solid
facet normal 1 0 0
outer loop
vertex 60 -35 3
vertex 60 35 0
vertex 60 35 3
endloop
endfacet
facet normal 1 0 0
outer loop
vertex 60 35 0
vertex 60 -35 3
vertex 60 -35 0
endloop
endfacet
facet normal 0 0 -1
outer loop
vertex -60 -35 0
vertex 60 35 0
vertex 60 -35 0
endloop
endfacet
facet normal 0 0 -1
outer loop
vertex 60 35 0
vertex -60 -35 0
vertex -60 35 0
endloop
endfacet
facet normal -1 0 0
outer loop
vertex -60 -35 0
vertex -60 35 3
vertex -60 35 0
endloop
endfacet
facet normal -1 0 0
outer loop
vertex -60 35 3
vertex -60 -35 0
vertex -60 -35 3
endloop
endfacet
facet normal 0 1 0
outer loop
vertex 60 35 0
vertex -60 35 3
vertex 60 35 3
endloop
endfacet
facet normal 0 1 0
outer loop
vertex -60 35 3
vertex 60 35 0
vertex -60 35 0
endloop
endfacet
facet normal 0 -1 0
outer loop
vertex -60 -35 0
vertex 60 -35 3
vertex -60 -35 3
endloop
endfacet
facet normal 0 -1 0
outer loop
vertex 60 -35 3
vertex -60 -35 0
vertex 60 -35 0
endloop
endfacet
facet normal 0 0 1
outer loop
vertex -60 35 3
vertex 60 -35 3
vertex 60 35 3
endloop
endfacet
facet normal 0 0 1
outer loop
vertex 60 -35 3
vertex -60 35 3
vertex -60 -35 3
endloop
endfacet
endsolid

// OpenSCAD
// Mini horizontal gel-electrophoresis box: open-top buffer tank with a central raised
// gel-tray platform and two horizontal end-wall electrode holes.
// Print orientation: tank base on the XY plane, building up in +Z.

$fn = 64;

// ---- Tank dimensions ----
outer_x      = 120;   // outer length along X
outer_y      = 70;    // outer width along Y
outer_h      = 40;    // outer height along Z
wall         = 3;     // wall thickness (sides and floor)

// ---- Platform dimensions ----
plat_x       = 60;    // platform length along X (centred)
plat_w       = outer_y; // platform spans the full inner width
plat_top_z   = 13;    // height of platform top above outer base

// ---- Electrode holes ----
hole_d       = 2;     // hole diameter
hole_y       = 0;     // hole centre Y position
hole_z       = 30;    // hole centre Z position

// ---- Derived ----
inner_h      = outer_h - wall;              // inner cavity height (37)
overlap      = 0.5;                         // cutter extension past faces
plat_t       = plat_top_z - (outer_h - wall); // platform thickness (10)

difference() {
    // Tank body: outer block minus floor thickness gives the hollow shell
    translate([-outer_x/2, -outer_y/2, 0])
        cube([outer_x, outer_y, outer_h]);

    // Inner cavity (extends above the open top so the shell has no coplanar faces)
    translate([-outer_x/2, -outer_y/2, wall])
        cube([outer_x, outer_y, inner_h + overlap]);

    // Central gel-tray platform
    translate([-plat_x/2, -plat_w/2, plat_top_z - plat_t])
        cube([plat_x, plat_w, plat_t]);

    // Horizontal electrode holes through each end wall along X
    for (sx = [-1, 1])
        translate([sx > 0 ? outer_x/2 - overlap : -outer_x/2, hole_y, hole_z])
            rotate([0, 90, 0])
                cylinder(d = hole_d, h = outer_x + 2*overlap);
}
